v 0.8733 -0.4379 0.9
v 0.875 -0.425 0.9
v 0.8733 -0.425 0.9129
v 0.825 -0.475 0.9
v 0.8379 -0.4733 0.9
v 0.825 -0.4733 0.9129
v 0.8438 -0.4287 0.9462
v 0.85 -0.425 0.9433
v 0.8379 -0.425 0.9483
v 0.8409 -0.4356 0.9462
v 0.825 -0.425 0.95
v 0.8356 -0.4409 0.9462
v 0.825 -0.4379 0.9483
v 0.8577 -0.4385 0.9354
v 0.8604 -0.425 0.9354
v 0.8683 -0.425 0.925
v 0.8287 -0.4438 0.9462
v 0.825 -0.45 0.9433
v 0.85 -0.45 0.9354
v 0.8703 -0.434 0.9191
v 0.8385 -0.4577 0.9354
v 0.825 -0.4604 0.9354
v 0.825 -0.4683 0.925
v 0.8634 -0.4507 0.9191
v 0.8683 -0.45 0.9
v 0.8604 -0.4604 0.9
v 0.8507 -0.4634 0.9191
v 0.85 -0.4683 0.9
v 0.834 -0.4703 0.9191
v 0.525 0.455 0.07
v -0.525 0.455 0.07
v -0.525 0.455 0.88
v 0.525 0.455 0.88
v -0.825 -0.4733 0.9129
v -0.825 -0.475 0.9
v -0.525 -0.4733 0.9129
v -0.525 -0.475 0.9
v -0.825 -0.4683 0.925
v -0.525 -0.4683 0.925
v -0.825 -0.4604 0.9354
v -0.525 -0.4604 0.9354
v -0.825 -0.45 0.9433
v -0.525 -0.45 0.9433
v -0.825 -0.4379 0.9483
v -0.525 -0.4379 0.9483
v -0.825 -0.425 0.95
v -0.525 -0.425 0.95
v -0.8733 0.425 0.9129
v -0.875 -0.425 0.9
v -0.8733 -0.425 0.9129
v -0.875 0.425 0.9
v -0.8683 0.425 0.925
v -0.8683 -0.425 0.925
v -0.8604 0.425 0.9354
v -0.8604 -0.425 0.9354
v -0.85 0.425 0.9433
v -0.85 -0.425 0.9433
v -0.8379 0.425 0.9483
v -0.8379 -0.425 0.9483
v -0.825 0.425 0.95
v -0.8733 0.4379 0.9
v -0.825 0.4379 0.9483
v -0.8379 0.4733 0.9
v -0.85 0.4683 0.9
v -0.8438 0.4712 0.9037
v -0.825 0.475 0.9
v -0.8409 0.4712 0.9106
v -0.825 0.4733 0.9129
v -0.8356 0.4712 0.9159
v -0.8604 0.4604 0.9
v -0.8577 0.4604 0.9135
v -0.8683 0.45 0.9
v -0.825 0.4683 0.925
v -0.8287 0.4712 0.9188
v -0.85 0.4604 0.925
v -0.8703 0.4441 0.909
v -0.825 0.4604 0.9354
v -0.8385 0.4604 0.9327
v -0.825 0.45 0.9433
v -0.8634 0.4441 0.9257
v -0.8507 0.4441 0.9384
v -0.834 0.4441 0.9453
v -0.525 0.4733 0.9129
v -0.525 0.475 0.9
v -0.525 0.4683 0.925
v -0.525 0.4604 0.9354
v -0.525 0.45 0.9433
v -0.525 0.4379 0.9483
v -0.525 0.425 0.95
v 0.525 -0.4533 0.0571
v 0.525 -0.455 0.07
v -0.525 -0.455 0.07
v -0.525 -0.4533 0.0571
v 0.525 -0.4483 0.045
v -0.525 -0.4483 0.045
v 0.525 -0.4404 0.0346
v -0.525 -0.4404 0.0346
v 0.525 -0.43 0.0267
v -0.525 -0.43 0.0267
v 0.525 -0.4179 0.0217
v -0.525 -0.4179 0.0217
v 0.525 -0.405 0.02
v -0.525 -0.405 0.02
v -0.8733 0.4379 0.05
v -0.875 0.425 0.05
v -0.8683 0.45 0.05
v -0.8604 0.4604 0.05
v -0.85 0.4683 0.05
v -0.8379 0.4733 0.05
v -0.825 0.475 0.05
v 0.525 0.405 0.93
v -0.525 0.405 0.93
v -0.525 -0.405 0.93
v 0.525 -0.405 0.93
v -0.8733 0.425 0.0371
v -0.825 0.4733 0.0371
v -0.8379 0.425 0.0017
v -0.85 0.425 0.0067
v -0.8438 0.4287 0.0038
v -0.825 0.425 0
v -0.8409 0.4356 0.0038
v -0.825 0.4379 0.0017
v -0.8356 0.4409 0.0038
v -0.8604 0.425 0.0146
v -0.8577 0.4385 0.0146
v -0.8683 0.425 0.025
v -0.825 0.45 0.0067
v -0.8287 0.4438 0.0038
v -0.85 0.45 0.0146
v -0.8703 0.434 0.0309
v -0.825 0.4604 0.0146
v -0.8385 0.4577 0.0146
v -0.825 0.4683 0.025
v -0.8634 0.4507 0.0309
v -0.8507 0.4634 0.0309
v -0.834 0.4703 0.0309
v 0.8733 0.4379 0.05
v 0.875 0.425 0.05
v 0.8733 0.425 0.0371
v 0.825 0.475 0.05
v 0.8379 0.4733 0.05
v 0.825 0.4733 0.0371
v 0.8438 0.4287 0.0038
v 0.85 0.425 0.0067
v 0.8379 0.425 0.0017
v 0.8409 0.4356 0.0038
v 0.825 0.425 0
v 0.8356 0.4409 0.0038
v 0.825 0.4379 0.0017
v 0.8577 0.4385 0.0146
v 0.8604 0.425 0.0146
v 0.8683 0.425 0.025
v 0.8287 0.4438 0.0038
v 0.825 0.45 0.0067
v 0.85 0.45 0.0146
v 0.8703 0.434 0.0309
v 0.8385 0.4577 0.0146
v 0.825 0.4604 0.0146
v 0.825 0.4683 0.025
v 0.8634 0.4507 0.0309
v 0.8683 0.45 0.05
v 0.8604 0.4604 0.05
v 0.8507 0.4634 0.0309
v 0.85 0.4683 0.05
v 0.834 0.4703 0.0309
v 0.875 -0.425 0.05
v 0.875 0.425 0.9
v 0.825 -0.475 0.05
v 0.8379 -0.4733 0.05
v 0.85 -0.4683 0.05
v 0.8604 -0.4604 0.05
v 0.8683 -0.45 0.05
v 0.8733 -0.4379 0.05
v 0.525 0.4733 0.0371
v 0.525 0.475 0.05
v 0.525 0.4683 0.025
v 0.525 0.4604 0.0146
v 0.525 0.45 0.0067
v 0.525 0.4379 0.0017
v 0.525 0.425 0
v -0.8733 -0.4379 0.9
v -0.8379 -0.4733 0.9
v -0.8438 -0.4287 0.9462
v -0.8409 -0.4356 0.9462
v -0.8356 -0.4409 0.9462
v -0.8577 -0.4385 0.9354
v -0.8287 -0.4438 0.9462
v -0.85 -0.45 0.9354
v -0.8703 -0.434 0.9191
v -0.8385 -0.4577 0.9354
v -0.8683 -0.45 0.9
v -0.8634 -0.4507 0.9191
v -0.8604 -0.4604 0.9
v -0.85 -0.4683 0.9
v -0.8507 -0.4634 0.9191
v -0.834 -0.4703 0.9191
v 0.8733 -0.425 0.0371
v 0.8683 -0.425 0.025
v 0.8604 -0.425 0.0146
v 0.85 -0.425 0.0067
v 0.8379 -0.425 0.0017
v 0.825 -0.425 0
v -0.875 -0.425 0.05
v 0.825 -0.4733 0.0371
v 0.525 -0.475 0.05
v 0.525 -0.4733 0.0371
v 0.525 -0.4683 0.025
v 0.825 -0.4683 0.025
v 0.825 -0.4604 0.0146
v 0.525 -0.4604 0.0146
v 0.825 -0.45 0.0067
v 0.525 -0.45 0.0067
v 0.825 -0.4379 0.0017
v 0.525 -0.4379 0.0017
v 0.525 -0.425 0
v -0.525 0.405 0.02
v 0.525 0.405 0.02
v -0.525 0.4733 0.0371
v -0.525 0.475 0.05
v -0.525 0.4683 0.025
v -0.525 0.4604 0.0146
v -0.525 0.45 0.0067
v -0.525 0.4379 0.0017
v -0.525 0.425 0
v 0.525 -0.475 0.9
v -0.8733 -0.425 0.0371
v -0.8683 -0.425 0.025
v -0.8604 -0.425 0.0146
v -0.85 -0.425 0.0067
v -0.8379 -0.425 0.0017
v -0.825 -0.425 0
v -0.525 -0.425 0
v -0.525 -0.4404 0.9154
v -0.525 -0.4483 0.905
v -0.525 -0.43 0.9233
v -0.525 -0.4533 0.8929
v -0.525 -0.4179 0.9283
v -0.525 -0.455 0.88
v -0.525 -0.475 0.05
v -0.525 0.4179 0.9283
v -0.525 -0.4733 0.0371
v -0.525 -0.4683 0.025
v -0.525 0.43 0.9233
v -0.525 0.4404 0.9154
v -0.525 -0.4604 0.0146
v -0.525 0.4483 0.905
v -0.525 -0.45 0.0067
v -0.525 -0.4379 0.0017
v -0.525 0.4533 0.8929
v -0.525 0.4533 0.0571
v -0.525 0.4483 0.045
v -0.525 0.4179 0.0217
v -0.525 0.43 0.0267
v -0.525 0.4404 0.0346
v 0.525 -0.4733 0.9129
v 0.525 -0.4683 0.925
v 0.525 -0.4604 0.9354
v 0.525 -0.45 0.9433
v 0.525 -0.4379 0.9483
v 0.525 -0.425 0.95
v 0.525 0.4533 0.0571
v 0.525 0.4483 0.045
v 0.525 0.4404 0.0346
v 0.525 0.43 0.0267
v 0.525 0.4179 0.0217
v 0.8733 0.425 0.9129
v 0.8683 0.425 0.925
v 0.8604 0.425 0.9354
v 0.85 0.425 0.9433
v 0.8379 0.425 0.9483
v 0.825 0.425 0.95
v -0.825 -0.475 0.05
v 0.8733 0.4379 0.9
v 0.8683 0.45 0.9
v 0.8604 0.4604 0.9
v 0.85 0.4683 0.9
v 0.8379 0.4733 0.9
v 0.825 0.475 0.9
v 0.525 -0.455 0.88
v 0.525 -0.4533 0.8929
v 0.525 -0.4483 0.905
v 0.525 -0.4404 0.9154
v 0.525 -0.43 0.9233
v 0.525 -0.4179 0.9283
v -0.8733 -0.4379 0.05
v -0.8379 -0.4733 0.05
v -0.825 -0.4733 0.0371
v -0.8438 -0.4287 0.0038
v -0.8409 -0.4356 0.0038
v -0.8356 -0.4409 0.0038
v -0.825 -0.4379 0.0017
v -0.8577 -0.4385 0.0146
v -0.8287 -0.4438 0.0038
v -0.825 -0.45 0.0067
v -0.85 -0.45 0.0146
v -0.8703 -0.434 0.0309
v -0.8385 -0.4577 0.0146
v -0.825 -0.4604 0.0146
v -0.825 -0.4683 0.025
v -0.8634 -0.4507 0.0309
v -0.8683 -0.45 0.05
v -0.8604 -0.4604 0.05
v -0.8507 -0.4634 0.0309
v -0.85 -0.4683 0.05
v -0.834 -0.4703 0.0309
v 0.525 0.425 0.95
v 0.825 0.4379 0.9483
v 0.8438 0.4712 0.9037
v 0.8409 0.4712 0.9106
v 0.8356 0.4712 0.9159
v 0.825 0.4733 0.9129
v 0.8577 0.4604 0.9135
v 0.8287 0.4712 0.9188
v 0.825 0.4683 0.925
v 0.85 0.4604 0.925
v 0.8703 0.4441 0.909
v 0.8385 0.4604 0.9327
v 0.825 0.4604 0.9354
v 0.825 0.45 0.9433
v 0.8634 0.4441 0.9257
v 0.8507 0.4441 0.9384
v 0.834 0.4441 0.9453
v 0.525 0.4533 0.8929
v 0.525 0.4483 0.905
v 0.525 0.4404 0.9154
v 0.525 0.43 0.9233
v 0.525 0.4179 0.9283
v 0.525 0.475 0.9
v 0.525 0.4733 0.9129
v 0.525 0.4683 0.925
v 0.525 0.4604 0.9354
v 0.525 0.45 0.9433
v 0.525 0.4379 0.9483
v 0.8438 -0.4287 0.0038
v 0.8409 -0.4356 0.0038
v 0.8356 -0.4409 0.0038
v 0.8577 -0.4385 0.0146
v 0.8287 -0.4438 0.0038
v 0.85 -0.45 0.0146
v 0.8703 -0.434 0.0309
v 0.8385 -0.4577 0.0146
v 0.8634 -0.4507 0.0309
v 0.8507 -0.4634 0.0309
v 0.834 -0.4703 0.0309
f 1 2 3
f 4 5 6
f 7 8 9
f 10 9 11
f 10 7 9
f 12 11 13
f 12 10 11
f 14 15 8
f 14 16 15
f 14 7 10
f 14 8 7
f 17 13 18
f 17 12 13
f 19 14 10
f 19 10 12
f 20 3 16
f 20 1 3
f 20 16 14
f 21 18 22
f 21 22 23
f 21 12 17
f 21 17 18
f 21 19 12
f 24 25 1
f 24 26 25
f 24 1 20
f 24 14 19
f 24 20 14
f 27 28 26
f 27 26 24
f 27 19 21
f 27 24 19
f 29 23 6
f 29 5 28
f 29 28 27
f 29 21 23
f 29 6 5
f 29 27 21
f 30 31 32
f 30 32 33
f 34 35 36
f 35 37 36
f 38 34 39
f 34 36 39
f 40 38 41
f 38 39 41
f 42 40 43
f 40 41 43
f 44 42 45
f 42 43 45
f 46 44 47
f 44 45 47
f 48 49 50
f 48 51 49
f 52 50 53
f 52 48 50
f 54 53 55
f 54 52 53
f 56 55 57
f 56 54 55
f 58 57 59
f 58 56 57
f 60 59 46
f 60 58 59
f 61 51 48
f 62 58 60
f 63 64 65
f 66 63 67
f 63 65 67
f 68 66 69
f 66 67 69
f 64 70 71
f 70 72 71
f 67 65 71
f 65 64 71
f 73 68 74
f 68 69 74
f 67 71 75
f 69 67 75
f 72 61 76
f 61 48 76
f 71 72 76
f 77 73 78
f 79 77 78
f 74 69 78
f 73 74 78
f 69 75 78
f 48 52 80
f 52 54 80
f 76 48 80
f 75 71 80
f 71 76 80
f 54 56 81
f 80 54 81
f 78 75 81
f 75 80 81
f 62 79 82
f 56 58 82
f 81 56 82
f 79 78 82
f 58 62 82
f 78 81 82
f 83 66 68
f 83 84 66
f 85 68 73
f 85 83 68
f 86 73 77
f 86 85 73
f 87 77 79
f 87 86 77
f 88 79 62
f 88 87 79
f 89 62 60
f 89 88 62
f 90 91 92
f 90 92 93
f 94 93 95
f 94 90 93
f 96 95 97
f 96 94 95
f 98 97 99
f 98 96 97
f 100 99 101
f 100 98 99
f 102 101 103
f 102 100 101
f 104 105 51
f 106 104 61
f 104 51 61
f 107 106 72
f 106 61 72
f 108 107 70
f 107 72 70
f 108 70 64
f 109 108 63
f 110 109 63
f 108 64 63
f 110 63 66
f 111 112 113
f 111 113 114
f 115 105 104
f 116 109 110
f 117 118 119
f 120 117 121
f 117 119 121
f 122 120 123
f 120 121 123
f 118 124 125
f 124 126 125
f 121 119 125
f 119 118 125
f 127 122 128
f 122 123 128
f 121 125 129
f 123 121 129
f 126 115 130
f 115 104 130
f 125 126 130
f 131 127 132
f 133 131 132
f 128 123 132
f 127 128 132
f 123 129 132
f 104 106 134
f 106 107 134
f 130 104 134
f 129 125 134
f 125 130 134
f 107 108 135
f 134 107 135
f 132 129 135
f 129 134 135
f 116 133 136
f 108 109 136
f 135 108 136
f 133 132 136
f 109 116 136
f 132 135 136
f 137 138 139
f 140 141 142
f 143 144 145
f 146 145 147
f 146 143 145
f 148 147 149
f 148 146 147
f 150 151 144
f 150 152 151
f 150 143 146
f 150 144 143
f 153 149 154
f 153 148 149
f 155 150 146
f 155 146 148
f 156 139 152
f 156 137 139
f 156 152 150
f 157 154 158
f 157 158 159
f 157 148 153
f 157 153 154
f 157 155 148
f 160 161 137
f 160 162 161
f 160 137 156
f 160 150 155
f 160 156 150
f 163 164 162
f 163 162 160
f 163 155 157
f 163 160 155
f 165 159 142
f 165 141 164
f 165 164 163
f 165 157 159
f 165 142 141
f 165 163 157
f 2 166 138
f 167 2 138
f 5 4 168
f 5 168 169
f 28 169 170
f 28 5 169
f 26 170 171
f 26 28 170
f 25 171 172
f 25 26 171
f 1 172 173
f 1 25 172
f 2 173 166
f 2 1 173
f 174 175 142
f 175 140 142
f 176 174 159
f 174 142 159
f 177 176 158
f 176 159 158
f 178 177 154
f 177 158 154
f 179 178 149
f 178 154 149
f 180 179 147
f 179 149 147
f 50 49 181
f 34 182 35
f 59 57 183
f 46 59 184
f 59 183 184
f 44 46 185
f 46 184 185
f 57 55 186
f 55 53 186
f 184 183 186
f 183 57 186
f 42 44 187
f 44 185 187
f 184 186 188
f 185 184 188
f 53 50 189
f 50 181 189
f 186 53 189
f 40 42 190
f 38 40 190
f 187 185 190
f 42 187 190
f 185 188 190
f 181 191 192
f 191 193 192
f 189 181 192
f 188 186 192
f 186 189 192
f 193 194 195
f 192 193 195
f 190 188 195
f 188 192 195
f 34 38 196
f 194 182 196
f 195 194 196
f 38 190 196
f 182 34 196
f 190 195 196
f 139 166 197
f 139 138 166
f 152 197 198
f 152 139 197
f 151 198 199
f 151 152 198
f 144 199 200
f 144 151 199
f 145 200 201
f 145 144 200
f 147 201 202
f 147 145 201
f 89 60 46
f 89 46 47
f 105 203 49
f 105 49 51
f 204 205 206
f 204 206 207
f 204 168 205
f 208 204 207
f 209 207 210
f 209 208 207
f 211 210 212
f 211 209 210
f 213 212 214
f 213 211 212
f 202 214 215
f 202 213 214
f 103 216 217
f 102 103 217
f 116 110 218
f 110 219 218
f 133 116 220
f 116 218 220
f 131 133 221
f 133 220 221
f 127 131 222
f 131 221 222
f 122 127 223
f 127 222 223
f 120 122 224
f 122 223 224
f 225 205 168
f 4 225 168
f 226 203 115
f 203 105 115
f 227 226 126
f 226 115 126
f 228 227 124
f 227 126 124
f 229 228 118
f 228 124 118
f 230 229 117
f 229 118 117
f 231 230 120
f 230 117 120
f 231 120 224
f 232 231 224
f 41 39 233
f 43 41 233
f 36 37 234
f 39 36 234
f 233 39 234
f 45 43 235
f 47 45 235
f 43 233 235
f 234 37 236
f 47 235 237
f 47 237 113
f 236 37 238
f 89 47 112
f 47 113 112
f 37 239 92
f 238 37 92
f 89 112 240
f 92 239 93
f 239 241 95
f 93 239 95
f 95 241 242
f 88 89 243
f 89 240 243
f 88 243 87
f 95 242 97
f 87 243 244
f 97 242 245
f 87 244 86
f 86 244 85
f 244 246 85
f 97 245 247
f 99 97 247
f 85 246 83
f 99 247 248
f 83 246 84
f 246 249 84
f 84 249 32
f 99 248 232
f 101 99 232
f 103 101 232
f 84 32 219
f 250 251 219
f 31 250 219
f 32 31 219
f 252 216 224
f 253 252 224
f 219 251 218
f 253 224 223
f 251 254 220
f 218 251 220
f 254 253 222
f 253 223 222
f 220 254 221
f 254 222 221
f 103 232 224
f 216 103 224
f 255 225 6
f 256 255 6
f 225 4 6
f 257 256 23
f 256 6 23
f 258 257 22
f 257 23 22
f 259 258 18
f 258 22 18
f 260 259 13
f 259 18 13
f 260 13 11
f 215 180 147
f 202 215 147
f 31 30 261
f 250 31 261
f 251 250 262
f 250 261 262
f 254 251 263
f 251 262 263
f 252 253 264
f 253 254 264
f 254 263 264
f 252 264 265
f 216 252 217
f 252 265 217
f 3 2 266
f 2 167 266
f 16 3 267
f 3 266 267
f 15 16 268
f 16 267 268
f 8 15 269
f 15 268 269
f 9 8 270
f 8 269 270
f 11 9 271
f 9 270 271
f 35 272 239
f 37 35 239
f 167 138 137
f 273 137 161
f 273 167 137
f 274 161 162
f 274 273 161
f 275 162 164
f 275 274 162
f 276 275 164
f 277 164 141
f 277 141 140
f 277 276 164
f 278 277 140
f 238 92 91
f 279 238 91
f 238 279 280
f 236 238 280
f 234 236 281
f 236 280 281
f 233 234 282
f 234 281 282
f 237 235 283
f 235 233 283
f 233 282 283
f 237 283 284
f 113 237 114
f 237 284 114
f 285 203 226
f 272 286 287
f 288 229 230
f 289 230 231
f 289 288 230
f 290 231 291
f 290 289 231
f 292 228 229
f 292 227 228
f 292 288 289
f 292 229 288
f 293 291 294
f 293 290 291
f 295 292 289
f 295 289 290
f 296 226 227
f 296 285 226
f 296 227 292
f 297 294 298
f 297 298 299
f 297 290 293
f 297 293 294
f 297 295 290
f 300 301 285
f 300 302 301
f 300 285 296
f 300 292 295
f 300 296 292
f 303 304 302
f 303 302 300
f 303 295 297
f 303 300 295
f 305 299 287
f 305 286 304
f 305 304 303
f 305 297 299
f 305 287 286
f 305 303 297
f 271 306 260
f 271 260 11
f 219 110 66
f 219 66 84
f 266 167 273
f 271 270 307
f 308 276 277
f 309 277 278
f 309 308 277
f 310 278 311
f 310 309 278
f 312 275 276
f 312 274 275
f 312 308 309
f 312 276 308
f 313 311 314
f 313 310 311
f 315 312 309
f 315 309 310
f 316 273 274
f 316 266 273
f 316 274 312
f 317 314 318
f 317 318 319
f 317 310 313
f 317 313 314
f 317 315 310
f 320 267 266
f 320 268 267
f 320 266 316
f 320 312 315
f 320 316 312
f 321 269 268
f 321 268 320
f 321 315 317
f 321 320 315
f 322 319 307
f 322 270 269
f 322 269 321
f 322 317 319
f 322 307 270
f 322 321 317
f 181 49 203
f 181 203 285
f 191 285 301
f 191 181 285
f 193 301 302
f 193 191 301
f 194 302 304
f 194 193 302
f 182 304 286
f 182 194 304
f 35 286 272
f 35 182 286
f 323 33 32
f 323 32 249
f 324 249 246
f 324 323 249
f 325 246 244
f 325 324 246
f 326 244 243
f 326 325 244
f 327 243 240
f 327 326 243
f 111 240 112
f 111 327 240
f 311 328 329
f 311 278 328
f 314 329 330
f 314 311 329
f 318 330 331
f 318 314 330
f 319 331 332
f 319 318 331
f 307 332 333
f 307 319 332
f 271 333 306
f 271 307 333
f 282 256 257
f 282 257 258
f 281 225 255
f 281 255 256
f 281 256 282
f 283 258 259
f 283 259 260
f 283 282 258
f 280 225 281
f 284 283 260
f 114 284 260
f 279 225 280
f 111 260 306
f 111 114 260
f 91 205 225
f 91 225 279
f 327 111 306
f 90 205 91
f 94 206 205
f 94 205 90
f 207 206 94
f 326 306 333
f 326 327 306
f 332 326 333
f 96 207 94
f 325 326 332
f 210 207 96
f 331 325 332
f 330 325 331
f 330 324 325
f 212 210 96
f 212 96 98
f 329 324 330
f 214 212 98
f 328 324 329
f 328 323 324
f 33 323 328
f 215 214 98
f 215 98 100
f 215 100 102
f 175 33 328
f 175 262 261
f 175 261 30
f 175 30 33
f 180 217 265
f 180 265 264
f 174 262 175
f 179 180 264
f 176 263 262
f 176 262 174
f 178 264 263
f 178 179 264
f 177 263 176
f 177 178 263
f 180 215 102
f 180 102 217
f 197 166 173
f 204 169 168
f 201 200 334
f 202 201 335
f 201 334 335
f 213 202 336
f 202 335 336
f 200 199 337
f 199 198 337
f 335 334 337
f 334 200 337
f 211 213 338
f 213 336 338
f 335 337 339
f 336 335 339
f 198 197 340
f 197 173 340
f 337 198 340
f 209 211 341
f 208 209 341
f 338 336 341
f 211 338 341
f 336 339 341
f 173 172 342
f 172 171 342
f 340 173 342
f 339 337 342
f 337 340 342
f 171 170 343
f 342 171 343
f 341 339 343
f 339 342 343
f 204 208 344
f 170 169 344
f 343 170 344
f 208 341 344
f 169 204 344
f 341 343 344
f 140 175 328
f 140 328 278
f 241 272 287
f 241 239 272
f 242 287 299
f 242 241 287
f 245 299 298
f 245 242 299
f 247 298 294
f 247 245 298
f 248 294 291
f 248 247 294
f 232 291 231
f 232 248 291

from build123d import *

# Parameters (mm, degrees)
PLATING_LEFT_W      = 0.35
PLATING_LEFT_H      = 0.95
PLATING_LEFT_DEPTH  = 0.95
PLATING_LEFT_F_R    = 0.05
PLATING_RIGHT_W     = 0.35
PLATING_RIGHT_H     = 0.95
PLATING_RIGHT_DEPTH = 0.95
PLATING_RIGHT_F_R   = 0.05
CHIP_W              = 1.71
CHIP_H              = 0.91
CHIP_DEPTH          = 0.91
CHIP_F_R            = 0.05


with BuildPart() as plating_left_f:
    # plating_left → plating_left (new body)
    with BuildSketch(Plane(origin=(-0.875, -0.475, 0), x_dir=(1, 0, 0), z_dir=(0, 0, 1))):
        with Locations((0.175, 0.475)):
            Rectangle(PLATING_LEFT_W, PLATING_LEFT_H)
    extrude(amount=PLATING_LEFT_DEPTH)

    # plating_left_f
    plating_left_f_edges = [plating_left_f.edges().sort_by_distance(p)[0] for p in [
        (-0.875, -0.475, 0.475),
        (-0.875, 0, 0.95),
        (-0.875, 0.475, 0.475),
        (-0.875, 0, 0),
        (-0.7, -0.475, 0),
        (-0.7, -0.475, 0.95),
        (-0.7, 0.475, 0),
        (-0.7, 0.475, 0.95),
    ]]
    fillet(plating_left_f_edges, radius=PLATING_LEFT_F_R)


with BuildPart() as plating_right_f:
    # plating_right → plating_right (new body)
    with BuildSketch(Plane(origin=(0.525, -0.475, 0), x_dir=(1, 0, 0), z_dir=(0, 0, 1))):
        with Locations((0.175, 0.475)):
            Rectangle(PLATING_RIGHT_W, PLATING_RIGHT_H)
    extrude(amount=PLATING_RIGHT_DEPTH)

    # plating_right_f
    plating_right_f_edges = [plating_right_f.edges().sort_by_distance(p)[0] for p in [
        (0.875, -0.475, 0.475),
        (0.875, 0, 0.95),
        (0.875, 0.475, 0.475),
        (0.875, 0, 0),
        (0.7, -0.475, 0),
        (0.7, -0.475, 0.95),
        (0.7, 0.475, 0),
        (0.7, 0.475, 0.95),
    ]]
    fillet(plating_right_f_edges, radius=PLATING_RIGHT_F_R)


with BuildPart() as capacitor:
    # chip → chip (new body)
    with BuildSketch(Plane(origin=(-0.855, -0.455, 0.02), x_dir=(1, 0, 0), z_dir=(0, 0, 1))):
        with Locations((0.855, 0.455)):
            Rectangle(CHIP_W, CHIP_H)
    extrude(amount=CHIP_DEPTH)

    # chip_f
    chip_f_edges = [capacitor.edges().sort_by_distance(p)[0] for p in [
        (0, -0.455, 0.02),
        (0, -0.455, 0.93),
        (0, 0.455, 0.02),
        (0, 0.455, 0.93),
    ]]
    fillet(chip_f_edges, radius=CHIP_F_R)

    # capacitor: union plating_left_f, plating_right_f
    add(plating_left_f.part)
    add(plating_right_f.part)


solid = capacitor.part
